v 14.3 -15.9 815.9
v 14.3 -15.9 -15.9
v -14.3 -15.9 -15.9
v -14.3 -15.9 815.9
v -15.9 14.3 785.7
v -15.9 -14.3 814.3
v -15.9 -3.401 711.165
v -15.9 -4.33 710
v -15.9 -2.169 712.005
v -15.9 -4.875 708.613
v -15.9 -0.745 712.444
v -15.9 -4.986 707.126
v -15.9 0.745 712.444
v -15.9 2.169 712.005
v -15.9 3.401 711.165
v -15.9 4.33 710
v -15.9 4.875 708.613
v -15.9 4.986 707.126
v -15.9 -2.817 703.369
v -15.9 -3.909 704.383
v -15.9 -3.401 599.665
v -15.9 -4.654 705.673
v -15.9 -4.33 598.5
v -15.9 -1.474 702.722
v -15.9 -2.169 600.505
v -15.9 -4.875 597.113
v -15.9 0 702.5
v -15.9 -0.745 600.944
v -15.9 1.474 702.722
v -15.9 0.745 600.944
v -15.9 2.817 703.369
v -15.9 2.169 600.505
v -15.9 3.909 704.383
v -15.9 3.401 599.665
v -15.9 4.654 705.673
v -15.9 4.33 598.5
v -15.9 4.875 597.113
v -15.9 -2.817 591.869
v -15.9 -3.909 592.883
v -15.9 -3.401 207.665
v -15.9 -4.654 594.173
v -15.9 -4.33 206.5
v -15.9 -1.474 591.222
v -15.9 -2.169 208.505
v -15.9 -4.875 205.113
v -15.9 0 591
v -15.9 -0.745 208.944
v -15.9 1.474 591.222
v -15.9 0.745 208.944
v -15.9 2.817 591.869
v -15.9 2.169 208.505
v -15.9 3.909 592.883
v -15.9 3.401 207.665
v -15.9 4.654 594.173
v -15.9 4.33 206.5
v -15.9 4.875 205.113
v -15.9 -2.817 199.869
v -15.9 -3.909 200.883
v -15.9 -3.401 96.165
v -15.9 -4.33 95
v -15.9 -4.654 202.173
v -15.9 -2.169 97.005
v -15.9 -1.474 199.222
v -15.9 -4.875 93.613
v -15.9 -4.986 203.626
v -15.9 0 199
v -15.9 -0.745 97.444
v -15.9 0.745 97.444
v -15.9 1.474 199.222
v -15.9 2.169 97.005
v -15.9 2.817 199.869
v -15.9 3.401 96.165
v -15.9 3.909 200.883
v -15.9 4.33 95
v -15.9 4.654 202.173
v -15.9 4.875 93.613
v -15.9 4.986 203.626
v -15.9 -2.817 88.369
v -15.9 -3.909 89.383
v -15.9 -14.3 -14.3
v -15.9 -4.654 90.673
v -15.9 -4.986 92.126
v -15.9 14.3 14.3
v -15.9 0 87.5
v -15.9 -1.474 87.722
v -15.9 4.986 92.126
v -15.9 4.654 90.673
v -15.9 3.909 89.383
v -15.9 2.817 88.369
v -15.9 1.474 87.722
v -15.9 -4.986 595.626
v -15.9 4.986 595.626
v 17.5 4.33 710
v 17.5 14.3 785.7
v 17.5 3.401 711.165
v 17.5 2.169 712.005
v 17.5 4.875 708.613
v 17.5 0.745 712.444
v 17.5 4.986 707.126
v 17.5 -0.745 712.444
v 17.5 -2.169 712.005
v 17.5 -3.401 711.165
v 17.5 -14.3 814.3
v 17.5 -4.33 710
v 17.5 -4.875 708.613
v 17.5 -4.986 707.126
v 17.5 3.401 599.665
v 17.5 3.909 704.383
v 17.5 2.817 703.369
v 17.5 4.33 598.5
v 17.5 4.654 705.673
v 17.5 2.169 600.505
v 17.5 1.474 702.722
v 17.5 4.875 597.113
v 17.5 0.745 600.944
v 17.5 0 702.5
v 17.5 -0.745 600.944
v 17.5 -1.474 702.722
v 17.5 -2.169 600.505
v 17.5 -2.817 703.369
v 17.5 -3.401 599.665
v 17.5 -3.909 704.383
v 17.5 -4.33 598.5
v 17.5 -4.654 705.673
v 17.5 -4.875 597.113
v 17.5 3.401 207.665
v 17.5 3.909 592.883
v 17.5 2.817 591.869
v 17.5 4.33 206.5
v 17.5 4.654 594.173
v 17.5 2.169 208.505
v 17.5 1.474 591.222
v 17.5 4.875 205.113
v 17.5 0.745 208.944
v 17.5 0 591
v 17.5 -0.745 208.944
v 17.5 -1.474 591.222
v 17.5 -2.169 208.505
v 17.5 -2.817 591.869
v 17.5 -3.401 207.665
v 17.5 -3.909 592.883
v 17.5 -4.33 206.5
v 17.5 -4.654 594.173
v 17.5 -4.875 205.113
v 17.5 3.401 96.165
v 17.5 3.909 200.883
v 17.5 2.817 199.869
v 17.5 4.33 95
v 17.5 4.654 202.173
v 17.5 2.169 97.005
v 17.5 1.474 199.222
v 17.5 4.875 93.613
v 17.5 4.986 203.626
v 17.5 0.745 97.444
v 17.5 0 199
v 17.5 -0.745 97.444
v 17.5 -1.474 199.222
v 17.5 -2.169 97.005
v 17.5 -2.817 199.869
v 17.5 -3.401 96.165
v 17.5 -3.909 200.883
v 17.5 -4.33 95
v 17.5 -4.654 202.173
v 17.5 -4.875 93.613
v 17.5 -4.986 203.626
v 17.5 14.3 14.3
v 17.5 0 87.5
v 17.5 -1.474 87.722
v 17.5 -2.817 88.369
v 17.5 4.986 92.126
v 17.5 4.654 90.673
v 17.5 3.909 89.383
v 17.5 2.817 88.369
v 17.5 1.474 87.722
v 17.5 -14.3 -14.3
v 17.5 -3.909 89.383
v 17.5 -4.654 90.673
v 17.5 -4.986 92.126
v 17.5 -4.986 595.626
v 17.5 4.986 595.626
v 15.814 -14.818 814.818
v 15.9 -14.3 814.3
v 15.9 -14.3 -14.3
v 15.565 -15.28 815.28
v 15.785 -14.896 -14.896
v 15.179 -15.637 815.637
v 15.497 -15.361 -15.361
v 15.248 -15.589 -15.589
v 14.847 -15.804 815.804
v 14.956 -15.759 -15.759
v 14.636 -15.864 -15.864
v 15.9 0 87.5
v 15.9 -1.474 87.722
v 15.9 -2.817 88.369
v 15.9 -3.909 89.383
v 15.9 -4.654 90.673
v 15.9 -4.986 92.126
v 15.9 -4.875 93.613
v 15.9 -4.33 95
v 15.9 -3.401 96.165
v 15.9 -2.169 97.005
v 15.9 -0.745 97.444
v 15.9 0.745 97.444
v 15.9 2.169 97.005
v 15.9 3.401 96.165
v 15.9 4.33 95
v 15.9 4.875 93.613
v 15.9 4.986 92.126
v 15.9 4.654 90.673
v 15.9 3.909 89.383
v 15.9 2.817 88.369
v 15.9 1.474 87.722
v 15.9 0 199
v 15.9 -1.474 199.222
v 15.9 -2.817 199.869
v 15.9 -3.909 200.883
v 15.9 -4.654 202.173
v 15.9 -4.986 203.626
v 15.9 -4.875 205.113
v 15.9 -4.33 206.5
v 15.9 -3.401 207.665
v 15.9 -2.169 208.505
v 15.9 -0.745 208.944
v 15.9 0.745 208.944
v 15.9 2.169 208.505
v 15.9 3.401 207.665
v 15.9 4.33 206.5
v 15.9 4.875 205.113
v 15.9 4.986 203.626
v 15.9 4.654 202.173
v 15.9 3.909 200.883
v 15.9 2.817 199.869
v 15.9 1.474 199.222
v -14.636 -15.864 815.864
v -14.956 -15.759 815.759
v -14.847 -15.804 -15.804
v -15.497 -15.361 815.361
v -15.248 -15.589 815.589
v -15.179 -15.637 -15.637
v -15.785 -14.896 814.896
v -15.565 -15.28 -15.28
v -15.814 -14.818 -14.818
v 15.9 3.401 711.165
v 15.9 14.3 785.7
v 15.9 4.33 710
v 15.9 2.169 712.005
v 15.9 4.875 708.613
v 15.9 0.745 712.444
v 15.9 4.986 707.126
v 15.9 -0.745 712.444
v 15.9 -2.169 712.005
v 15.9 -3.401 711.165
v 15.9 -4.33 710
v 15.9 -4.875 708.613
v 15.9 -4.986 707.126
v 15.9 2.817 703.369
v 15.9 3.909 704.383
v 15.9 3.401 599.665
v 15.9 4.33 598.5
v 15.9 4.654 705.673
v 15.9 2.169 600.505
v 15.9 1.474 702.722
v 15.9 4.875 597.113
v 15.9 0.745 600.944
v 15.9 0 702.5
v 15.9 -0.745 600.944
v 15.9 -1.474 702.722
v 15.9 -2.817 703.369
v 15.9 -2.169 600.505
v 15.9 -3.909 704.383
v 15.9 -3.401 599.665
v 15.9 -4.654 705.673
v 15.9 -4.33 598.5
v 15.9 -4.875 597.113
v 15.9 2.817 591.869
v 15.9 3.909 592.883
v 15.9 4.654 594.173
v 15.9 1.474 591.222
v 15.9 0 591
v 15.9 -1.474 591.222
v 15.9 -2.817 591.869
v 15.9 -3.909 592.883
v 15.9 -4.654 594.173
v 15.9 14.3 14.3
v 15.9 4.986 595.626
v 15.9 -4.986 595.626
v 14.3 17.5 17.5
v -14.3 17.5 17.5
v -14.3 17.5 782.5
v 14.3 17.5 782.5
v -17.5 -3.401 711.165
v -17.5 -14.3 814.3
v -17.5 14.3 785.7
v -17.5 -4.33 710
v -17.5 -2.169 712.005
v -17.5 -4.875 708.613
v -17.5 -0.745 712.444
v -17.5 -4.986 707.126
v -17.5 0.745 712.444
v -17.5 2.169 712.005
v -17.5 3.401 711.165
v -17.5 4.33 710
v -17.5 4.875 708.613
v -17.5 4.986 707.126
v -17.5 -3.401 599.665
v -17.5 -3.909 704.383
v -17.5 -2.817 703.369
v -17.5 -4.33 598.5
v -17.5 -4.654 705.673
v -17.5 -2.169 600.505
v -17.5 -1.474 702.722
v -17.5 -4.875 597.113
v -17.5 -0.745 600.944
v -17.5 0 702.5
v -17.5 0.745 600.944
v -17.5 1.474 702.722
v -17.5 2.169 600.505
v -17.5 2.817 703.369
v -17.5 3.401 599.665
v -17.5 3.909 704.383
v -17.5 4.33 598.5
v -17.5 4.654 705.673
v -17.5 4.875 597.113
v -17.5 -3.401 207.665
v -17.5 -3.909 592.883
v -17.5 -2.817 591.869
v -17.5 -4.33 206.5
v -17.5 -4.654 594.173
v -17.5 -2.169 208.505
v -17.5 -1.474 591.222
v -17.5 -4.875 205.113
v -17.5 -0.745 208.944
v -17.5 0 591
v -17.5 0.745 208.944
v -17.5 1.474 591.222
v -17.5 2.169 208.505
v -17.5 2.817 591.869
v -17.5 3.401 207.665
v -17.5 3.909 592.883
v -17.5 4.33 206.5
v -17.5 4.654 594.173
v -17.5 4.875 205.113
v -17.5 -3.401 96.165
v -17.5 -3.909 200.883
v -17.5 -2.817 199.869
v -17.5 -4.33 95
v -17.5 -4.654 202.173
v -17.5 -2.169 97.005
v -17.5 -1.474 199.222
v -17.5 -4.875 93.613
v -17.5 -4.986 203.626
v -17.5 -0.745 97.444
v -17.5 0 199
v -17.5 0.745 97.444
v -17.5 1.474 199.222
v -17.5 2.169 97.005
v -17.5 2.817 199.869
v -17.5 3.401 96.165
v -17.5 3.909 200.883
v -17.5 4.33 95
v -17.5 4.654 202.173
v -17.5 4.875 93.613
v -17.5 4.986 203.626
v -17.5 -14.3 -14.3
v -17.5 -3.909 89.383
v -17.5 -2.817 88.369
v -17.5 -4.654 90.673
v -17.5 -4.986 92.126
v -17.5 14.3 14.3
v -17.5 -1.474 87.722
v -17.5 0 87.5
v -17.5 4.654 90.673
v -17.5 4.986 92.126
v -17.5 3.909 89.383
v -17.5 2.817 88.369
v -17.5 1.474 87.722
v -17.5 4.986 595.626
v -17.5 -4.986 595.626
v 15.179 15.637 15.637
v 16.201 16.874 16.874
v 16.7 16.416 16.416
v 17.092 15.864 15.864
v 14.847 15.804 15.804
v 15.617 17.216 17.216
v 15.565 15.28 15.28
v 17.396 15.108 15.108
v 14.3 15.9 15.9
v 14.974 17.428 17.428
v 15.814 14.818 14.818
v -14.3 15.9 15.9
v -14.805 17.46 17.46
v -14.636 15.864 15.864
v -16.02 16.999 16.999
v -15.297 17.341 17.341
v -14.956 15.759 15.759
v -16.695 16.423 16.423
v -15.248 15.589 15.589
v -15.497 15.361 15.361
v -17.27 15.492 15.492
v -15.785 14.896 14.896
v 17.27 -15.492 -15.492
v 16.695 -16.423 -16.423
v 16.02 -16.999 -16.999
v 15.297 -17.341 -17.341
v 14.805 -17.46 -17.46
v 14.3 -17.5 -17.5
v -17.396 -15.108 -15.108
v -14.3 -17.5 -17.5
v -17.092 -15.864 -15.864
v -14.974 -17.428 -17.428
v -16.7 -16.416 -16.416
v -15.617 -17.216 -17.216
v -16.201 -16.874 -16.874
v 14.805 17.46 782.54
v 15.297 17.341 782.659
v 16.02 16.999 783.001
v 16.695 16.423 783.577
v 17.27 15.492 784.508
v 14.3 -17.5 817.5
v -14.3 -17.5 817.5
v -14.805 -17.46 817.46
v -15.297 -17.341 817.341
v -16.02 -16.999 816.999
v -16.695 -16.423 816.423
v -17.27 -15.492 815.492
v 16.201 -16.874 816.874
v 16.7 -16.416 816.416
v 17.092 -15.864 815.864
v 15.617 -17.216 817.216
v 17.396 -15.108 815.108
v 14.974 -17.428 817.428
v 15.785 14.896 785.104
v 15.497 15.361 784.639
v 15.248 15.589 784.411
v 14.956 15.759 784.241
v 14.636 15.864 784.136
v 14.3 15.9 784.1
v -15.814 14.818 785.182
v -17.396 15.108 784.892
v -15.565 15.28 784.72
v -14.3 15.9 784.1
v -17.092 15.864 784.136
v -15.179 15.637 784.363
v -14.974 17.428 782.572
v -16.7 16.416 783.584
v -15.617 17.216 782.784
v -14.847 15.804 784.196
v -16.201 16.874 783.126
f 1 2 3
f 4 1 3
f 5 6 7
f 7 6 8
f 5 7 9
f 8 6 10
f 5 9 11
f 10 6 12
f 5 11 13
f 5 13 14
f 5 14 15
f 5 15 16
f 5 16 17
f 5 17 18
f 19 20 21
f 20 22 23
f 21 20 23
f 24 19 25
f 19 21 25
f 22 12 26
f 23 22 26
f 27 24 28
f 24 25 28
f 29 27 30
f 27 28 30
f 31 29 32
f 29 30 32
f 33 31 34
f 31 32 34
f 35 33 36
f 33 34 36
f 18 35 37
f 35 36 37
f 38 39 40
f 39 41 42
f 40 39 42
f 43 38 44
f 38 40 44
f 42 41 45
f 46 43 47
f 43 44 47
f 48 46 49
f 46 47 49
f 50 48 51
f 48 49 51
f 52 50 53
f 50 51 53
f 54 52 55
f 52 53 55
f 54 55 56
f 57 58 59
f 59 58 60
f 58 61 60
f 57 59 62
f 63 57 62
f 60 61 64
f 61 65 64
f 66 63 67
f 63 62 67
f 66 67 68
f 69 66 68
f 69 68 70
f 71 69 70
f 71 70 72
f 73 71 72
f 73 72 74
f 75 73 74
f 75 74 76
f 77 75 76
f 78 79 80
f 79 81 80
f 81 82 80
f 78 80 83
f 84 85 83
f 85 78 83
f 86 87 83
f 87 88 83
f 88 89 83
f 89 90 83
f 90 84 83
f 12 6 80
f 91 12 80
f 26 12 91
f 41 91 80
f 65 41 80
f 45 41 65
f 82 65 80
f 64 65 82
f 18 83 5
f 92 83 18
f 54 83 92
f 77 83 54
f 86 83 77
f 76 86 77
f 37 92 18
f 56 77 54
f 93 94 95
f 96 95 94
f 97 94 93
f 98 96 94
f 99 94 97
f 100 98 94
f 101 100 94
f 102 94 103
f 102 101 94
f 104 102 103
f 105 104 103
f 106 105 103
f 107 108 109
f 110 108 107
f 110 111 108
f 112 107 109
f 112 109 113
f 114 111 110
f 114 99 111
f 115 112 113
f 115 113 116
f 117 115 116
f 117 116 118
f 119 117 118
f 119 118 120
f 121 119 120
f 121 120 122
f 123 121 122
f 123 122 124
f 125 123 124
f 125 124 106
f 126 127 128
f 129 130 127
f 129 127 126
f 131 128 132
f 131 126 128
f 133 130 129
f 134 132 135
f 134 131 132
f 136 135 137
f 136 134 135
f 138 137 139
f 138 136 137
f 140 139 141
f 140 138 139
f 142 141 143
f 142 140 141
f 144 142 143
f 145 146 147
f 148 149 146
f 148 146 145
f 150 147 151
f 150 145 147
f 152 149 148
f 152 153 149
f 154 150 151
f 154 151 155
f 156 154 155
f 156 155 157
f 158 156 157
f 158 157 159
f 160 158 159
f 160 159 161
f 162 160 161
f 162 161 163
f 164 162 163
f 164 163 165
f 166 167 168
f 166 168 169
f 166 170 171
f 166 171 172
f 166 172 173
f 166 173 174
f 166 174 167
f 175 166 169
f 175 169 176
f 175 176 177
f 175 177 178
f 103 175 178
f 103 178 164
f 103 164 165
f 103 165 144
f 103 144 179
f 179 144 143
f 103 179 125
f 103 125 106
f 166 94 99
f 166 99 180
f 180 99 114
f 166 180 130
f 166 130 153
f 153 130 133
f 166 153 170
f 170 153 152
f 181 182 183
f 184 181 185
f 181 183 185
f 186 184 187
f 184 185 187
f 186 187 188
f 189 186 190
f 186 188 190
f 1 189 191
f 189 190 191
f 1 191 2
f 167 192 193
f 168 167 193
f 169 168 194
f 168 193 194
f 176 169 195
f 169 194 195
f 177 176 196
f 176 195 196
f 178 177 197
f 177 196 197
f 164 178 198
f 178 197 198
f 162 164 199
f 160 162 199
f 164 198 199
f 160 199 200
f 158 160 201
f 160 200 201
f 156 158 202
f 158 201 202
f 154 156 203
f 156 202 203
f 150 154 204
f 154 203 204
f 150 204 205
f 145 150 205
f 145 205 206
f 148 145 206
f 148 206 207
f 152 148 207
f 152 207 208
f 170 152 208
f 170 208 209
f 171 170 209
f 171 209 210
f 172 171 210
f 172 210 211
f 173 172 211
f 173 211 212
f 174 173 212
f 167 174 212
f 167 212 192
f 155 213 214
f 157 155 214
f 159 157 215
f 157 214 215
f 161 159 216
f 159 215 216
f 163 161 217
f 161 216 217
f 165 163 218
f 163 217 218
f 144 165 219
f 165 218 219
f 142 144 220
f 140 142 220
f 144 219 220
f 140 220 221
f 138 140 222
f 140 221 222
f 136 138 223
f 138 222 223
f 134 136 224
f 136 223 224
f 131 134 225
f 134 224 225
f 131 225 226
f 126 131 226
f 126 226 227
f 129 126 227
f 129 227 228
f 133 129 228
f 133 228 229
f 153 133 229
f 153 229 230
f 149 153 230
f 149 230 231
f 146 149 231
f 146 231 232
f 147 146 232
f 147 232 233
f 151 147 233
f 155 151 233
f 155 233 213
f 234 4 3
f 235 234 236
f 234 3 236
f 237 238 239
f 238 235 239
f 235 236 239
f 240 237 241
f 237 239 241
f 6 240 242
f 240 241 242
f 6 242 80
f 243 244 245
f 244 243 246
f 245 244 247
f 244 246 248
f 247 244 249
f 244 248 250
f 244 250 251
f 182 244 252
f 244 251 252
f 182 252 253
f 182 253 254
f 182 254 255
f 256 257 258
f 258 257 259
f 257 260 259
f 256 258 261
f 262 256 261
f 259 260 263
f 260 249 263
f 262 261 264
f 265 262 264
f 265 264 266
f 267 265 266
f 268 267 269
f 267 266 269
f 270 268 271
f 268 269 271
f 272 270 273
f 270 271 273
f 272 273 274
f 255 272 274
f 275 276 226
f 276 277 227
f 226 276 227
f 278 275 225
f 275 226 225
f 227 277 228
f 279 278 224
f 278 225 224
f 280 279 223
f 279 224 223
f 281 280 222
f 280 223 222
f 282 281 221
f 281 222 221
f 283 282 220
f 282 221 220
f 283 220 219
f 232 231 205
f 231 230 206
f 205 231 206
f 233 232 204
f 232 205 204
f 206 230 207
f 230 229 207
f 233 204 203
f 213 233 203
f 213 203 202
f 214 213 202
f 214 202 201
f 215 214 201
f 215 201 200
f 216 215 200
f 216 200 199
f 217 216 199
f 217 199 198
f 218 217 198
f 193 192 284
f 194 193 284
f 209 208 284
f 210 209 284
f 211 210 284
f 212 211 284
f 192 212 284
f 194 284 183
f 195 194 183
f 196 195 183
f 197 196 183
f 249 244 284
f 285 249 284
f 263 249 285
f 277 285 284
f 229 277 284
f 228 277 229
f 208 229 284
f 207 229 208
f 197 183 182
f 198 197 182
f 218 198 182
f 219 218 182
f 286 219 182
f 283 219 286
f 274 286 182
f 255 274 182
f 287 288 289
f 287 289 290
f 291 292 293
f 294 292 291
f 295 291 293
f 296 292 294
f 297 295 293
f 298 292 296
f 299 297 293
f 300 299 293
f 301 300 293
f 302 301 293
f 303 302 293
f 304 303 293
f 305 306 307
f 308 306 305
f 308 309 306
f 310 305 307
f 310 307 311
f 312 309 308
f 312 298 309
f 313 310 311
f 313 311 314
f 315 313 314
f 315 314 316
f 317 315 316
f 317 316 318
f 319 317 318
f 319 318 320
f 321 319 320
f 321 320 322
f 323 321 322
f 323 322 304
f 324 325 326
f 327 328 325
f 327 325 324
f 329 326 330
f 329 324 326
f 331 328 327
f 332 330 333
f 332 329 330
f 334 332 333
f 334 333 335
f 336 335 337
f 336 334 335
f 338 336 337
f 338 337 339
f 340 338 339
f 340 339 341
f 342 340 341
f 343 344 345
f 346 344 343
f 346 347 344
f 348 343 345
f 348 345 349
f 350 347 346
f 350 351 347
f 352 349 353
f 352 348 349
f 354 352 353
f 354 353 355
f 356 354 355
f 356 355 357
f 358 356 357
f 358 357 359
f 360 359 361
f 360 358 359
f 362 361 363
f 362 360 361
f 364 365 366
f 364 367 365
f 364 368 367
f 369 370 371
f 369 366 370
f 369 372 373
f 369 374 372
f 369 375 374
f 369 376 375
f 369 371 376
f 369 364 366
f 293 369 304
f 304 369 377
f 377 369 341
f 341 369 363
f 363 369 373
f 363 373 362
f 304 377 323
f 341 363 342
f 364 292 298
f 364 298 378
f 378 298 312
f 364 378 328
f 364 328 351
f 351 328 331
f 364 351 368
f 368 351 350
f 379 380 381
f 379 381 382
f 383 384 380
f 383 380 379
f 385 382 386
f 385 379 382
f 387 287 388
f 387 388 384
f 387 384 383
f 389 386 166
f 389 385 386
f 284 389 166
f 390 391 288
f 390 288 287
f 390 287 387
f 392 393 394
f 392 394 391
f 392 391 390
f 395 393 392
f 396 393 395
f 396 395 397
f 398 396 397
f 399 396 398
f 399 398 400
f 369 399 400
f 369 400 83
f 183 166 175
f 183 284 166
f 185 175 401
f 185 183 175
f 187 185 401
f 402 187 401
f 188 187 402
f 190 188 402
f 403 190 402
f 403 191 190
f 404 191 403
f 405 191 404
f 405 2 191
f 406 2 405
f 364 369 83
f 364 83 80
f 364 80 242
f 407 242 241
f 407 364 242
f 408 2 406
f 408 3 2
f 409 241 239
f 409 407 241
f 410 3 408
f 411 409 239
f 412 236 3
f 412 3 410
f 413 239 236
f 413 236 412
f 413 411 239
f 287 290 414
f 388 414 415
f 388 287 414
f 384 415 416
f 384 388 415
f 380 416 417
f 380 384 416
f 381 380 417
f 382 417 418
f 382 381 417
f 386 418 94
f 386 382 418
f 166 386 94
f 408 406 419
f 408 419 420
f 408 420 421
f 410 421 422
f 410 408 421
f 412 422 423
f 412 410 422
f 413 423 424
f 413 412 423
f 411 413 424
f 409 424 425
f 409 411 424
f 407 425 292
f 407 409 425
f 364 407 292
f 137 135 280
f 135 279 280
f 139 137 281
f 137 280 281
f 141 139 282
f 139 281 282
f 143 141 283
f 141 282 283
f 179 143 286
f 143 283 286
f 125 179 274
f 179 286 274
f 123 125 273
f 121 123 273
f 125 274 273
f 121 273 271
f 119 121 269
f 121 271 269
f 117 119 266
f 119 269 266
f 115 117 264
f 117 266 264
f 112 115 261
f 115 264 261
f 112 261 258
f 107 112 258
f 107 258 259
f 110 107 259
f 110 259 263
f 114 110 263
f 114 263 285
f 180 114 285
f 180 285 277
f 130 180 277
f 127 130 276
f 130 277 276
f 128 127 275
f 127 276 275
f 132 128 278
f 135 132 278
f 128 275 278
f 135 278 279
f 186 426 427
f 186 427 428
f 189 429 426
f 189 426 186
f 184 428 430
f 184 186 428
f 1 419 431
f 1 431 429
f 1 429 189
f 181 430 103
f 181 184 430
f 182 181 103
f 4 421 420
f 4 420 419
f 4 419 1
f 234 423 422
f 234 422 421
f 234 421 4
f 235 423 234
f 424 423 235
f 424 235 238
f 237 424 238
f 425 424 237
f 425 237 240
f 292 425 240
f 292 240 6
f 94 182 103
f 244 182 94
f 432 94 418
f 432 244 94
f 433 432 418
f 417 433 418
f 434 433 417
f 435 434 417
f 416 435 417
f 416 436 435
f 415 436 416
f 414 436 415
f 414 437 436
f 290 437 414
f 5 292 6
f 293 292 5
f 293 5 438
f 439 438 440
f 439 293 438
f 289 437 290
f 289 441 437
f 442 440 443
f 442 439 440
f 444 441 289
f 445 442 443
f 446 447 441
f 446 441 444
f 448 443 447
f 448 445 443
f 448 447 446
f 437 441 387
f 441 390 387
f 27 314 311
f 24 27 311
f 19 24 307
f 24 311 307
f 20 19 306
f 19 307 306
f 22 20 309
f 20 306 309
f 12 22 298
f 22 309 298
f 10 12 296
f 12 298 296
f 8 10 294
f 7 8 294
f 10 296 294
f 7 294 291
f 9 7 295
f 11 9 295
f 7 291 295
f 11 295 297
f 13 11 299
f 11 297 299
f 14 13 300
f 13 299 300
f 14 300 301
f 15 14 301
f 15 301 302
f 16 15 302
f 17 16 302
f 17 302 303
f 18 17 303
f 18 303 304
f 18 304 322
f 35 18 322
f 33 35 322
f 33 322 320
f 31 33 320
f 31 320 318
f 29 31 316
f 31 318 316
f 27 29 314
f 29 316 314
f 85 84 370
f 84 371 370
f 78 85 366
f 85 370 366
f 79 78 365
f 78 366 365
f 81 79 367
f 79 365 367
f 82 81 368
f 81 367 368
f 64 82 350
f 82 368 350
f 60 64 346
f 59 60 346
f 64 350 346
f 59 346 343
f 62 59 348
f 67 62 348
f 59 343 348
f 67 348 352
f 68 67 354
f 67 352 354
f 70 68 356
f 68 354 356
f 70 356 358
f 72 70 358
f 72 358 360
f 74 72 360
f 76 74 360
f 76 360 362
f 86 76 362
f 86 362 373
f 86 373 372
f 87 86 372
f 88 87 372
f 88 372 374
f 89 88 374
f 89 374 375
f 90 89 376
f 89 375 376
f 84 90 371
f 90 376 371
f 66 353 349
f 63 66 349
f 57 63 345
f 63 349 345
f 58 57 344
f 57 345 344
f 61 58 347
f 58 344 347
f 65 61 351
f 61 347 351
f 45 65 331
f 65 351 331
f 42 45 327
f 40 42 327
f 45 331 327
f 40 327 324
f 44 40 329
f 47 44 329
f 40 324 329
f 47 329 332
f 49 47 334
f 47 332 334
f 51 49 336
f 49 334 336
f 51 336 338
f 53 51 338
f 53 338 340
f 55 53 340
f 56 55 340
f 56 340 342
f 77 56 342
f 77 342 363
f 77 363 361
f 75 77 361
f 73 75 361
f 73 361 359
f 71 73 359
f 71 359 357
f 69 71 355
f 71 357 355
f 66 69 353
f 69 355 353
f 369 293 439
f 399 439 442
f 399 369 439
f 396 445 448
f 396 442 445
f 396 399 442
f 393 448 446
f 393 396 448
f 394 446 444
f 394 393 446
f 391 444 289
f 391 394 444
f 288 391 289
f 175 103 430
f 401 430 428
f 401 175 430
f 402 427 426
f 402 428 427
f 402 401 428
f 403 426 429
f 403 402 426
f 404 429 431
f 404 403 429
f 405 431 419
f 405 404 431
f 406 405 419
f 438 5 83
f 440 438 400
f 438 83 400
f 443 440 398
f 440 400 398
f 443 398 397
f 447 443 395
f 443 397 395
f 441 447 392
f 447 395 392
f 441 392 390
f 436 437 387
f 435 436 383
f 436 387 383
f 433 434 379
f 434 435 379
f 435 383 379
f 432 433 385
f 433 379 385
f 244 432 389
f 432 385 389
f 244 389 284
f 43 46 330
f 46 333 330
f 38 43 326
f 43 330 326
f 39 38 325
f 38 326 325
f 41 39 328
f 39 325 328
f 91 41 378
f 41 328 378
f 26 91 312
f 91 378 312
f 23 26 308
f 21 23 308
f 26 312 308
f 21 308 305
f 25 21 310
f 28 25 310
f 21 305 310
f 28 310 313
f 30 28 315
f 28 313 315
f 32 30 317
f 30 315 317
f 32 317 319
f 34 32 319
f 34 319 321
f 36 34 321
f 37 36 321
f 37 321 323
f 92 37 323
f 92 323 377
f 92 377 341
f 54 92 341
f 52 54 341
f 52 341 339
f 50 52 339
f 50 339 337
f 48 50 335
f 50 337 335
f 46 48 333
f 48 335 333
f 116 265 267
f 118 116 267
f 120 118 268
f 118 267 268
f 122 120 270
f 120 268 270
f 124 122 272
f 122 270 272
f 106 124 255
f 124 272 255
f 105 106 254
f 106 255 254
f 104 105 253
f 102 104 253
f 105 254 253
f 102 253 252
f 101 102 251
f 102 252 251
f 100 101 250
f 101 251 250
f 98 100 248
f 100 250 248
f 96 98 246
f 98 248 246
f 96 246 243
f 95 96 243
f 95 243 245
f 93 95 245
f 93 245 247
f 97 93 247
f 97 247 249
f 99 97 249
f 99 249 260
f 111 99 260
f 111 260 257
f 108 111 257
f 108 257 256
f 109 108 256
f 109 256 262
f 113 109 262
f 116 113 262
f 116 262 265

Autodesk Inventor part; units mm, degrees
ref_plane "Start plane" through (0, 0, -17.5) normal (0, 0, 1) x (1, 0, 0)
ref_plane "End plane" through (0, 0, 817.5) normal (0, 0, 1) x (1, 0, 0)
sketch "Sketch" plane through (0, 0, 0) normal (0, 0, 1) x (1, 0, 0)
  line L0 (-17.5, -14.3) -> (-17.5, 14.3)
  line L1 (-14.3, 17.5) -> (14.3, 17.5)
  line L2 (17.5, 14.3) -> (17.5, -14.3)
  line L3 (14.3, -17.5) -> (-14.3, -17.5)
  arc A0 (-17.5, -14.3) -> (-14.3, -17.5) centre (-14.3, -14.3) ccw
  arc A1 (-14.3, 17.5) -> (-17.5, 14.3) centre (-14.3, 14.3) ccw
  arc A2 (17.5, 14.3) -> (14.3, 17.5) centre (14.3, 14.3) ccw
  arc A3 (14.3, -17.5) -> (17.5, -14.3) centre (14.3, -14.3) ccw
  arc A4 (-14.3, 15.9) -> (-15.9, 14.3) centre (-14.3, 14.3) ccw
  line L4 (-14.3, 15.9) -> (14.3, 15.9)
  arc A5 (15.9, 14.3) -> (14.3, 15.9) centre (14.3, 14.3) ccw
  line L5 (15.9, 14.3) -> (15.9, -14.3)
  arc A6 (14.3, -15.9) -> (15.9, -14.3) centre (14.3, -14.3) ccw
  line L6 (14.3, -15.9) -> (-14.3, -15.9)
  arc A7 (-15.9, -14.3) -> (-14.3, -15.9) centre (-14.3, -14.3) ccw
  line L7 (-15.9, -14.3) -> (-15.9, 14.3)
  line L8 (0, 25.4278) -> (0, -25.4278) construction
  line L9 (-25.4278, 0) -> (25.4278, 0) construction
  dimension "d7" = 3.2
  dimension "d10" = 35
  dimension "d11" = 35
  dimension "d12" = 1.6
  dimension "d15" = 17.5
  dimension "d16" = 17.5
extrude "Body" add sketch "Sketch" along normal up to surface (835 mm away) from surface at -17.5
sketch "Sketch3" plane through (0, 0, 0) normal (0, 0, 1) x (1, 0, 0)
  line L0 (0, 0) -> (10, 0)
ref_plane "Work Plane3" through (0, 0, 0) normal (0, -1, 0) x (1, 0, 0)
sketch "Sketch4" plane through (0, 0, 0) normal (0, -1, 0) x (1, 0, 0)
  line L0 (-2, -17.5) -> (12, -17.5)
  line L1 (-2, 817.5) -> (12, 817.5)
  dimension "d18" = 835
ref_plane "Work Plane7" through (10, 0, -17.5) normal (0, 0, -1) x (-1, 0, 0)
split "Split4" plane through (10, 0, -17.5) removes the side toward (0, 0, -1)
ref_plane "Work Plane8" through (0, -17.5, -17.5) normal (0, 0.7071, -0.7071) x (1, 0, 0)
split "Split5" plane through (0, -17.5, -17.5) removes the side toward (0, 0.7071, -0.7071)
ref_plane "Work Plane9" through (0, -17.5, 817.5) normal (0, 0.7071, 0.7071) x (1, 0, 0)
split "Split6" plane through (0, -17.5, 817.5) removes the side toward (0, 0.7071, 0.7071)
sketch "Sketch5" plane through (17.5, -14.3, 814.3) normal (1, 0, 0) x (0, 0, -1)
  line L0 (28.6, 28.6) -> (0, 0) construction
  line L1 (0, 0) -> (828.6, 0) construction
  line L2 (828.6, 0) -> (800, 28.6) construction
  line L3 (28.6, 28.6) -> (200, 28.6) construction
  line L4 (721.8, 0) -> (721.8, 28.6) construction
  line L5 (28.6, 28.6) -> (800, 28.6) construction
  line L6 (796.8, 496.8) -> (796.8, 31.8) construction
  line L7 (721.8, 14.3) -> (610.3, 14.3) construction
  line L8 (610.3, 28.6) -> (610.3, 0) construction
  line L9 (31.8, 96.8) -> (31.8, 31.8) construction
  line L10 (106.8, 28.6) -> (106.8, 0) construction
  line L11 (106.8, 14.3) -> (218.3, 14.3) construction
  line L12 (218.3, 28.6) -> (218.3, 0) construction
  line L13 (200, 28.6) -> (200, 14.3) projected
  line L14 (228.6, 28.6) -> (400, 28.6) projected
  line L15 (228.6, 28.6) -> (228.6, 14.3) projected
  line L16 (228.6, 14.3) -> (200, 14.3) projected
  line L17 (400, 28.6) -> (400, 14.3) projected
  line L18 (428.6, 28.6) -> (600, 28.6) projected
  line L19 (428.6, 28.6) -> (428.6, 14.3) projected
  line L20 (428.6, 14.3) -> (400, 14.3) projected
  line L21 (600, 28.6) -> (600, 14.3) projected
  line L22 (628.6, 28.6) -> (800, 28.6) projected
  line L23 (628.6, 28.6) -> (628.6, 14.3) projected
  line L24 (628.6, 14.3) -> (600, 14.3) projected
  point P0 (814.3, 14.3)
  dimension "d19" = 75
  dimension "d20" = 111.5
  dimension "d22" = 75
  dimension "d23" = 111.5
hole "Hole1" at (17.5, 0, 92.5) at (17.5, 0, 204) at (17.5, 0, 596) at (17.5, 0, 707.5) direction (-1, 0, 0) diameter 10 end through all
equation "\"d7\" = G_IR"
equation "\"d10\" = G_H"
equation "\"d11\" = G_W"
equation "\"d12\" = G_T"
equation "\"d15\" = 0.5 * d10"
equation "\"d16\" = 0.5 * d11"
equation "\"d3\" = G_L"
equation "\"G_W\" = 35"
equation "\"G_H\" = 35"
equation "\"G_T\" = 1.6"
equation "\"G_IR\" = 3.2"
equation "\"G_L\" = d18"
equation "\"G_OFFSET_START\" = 17.5"
equation "\"G_OFFSET_END\" = 17.5"
equation "\"d13\" = -G_OFFSET_START"
equation "\"d14\" = G_OFFSET_END + B_L"
equation "\"B_L\" = 800"
properties part number "AS 1163 - C350L0 35x35x1.6 SHS - 835" material "Steel, Mild"
